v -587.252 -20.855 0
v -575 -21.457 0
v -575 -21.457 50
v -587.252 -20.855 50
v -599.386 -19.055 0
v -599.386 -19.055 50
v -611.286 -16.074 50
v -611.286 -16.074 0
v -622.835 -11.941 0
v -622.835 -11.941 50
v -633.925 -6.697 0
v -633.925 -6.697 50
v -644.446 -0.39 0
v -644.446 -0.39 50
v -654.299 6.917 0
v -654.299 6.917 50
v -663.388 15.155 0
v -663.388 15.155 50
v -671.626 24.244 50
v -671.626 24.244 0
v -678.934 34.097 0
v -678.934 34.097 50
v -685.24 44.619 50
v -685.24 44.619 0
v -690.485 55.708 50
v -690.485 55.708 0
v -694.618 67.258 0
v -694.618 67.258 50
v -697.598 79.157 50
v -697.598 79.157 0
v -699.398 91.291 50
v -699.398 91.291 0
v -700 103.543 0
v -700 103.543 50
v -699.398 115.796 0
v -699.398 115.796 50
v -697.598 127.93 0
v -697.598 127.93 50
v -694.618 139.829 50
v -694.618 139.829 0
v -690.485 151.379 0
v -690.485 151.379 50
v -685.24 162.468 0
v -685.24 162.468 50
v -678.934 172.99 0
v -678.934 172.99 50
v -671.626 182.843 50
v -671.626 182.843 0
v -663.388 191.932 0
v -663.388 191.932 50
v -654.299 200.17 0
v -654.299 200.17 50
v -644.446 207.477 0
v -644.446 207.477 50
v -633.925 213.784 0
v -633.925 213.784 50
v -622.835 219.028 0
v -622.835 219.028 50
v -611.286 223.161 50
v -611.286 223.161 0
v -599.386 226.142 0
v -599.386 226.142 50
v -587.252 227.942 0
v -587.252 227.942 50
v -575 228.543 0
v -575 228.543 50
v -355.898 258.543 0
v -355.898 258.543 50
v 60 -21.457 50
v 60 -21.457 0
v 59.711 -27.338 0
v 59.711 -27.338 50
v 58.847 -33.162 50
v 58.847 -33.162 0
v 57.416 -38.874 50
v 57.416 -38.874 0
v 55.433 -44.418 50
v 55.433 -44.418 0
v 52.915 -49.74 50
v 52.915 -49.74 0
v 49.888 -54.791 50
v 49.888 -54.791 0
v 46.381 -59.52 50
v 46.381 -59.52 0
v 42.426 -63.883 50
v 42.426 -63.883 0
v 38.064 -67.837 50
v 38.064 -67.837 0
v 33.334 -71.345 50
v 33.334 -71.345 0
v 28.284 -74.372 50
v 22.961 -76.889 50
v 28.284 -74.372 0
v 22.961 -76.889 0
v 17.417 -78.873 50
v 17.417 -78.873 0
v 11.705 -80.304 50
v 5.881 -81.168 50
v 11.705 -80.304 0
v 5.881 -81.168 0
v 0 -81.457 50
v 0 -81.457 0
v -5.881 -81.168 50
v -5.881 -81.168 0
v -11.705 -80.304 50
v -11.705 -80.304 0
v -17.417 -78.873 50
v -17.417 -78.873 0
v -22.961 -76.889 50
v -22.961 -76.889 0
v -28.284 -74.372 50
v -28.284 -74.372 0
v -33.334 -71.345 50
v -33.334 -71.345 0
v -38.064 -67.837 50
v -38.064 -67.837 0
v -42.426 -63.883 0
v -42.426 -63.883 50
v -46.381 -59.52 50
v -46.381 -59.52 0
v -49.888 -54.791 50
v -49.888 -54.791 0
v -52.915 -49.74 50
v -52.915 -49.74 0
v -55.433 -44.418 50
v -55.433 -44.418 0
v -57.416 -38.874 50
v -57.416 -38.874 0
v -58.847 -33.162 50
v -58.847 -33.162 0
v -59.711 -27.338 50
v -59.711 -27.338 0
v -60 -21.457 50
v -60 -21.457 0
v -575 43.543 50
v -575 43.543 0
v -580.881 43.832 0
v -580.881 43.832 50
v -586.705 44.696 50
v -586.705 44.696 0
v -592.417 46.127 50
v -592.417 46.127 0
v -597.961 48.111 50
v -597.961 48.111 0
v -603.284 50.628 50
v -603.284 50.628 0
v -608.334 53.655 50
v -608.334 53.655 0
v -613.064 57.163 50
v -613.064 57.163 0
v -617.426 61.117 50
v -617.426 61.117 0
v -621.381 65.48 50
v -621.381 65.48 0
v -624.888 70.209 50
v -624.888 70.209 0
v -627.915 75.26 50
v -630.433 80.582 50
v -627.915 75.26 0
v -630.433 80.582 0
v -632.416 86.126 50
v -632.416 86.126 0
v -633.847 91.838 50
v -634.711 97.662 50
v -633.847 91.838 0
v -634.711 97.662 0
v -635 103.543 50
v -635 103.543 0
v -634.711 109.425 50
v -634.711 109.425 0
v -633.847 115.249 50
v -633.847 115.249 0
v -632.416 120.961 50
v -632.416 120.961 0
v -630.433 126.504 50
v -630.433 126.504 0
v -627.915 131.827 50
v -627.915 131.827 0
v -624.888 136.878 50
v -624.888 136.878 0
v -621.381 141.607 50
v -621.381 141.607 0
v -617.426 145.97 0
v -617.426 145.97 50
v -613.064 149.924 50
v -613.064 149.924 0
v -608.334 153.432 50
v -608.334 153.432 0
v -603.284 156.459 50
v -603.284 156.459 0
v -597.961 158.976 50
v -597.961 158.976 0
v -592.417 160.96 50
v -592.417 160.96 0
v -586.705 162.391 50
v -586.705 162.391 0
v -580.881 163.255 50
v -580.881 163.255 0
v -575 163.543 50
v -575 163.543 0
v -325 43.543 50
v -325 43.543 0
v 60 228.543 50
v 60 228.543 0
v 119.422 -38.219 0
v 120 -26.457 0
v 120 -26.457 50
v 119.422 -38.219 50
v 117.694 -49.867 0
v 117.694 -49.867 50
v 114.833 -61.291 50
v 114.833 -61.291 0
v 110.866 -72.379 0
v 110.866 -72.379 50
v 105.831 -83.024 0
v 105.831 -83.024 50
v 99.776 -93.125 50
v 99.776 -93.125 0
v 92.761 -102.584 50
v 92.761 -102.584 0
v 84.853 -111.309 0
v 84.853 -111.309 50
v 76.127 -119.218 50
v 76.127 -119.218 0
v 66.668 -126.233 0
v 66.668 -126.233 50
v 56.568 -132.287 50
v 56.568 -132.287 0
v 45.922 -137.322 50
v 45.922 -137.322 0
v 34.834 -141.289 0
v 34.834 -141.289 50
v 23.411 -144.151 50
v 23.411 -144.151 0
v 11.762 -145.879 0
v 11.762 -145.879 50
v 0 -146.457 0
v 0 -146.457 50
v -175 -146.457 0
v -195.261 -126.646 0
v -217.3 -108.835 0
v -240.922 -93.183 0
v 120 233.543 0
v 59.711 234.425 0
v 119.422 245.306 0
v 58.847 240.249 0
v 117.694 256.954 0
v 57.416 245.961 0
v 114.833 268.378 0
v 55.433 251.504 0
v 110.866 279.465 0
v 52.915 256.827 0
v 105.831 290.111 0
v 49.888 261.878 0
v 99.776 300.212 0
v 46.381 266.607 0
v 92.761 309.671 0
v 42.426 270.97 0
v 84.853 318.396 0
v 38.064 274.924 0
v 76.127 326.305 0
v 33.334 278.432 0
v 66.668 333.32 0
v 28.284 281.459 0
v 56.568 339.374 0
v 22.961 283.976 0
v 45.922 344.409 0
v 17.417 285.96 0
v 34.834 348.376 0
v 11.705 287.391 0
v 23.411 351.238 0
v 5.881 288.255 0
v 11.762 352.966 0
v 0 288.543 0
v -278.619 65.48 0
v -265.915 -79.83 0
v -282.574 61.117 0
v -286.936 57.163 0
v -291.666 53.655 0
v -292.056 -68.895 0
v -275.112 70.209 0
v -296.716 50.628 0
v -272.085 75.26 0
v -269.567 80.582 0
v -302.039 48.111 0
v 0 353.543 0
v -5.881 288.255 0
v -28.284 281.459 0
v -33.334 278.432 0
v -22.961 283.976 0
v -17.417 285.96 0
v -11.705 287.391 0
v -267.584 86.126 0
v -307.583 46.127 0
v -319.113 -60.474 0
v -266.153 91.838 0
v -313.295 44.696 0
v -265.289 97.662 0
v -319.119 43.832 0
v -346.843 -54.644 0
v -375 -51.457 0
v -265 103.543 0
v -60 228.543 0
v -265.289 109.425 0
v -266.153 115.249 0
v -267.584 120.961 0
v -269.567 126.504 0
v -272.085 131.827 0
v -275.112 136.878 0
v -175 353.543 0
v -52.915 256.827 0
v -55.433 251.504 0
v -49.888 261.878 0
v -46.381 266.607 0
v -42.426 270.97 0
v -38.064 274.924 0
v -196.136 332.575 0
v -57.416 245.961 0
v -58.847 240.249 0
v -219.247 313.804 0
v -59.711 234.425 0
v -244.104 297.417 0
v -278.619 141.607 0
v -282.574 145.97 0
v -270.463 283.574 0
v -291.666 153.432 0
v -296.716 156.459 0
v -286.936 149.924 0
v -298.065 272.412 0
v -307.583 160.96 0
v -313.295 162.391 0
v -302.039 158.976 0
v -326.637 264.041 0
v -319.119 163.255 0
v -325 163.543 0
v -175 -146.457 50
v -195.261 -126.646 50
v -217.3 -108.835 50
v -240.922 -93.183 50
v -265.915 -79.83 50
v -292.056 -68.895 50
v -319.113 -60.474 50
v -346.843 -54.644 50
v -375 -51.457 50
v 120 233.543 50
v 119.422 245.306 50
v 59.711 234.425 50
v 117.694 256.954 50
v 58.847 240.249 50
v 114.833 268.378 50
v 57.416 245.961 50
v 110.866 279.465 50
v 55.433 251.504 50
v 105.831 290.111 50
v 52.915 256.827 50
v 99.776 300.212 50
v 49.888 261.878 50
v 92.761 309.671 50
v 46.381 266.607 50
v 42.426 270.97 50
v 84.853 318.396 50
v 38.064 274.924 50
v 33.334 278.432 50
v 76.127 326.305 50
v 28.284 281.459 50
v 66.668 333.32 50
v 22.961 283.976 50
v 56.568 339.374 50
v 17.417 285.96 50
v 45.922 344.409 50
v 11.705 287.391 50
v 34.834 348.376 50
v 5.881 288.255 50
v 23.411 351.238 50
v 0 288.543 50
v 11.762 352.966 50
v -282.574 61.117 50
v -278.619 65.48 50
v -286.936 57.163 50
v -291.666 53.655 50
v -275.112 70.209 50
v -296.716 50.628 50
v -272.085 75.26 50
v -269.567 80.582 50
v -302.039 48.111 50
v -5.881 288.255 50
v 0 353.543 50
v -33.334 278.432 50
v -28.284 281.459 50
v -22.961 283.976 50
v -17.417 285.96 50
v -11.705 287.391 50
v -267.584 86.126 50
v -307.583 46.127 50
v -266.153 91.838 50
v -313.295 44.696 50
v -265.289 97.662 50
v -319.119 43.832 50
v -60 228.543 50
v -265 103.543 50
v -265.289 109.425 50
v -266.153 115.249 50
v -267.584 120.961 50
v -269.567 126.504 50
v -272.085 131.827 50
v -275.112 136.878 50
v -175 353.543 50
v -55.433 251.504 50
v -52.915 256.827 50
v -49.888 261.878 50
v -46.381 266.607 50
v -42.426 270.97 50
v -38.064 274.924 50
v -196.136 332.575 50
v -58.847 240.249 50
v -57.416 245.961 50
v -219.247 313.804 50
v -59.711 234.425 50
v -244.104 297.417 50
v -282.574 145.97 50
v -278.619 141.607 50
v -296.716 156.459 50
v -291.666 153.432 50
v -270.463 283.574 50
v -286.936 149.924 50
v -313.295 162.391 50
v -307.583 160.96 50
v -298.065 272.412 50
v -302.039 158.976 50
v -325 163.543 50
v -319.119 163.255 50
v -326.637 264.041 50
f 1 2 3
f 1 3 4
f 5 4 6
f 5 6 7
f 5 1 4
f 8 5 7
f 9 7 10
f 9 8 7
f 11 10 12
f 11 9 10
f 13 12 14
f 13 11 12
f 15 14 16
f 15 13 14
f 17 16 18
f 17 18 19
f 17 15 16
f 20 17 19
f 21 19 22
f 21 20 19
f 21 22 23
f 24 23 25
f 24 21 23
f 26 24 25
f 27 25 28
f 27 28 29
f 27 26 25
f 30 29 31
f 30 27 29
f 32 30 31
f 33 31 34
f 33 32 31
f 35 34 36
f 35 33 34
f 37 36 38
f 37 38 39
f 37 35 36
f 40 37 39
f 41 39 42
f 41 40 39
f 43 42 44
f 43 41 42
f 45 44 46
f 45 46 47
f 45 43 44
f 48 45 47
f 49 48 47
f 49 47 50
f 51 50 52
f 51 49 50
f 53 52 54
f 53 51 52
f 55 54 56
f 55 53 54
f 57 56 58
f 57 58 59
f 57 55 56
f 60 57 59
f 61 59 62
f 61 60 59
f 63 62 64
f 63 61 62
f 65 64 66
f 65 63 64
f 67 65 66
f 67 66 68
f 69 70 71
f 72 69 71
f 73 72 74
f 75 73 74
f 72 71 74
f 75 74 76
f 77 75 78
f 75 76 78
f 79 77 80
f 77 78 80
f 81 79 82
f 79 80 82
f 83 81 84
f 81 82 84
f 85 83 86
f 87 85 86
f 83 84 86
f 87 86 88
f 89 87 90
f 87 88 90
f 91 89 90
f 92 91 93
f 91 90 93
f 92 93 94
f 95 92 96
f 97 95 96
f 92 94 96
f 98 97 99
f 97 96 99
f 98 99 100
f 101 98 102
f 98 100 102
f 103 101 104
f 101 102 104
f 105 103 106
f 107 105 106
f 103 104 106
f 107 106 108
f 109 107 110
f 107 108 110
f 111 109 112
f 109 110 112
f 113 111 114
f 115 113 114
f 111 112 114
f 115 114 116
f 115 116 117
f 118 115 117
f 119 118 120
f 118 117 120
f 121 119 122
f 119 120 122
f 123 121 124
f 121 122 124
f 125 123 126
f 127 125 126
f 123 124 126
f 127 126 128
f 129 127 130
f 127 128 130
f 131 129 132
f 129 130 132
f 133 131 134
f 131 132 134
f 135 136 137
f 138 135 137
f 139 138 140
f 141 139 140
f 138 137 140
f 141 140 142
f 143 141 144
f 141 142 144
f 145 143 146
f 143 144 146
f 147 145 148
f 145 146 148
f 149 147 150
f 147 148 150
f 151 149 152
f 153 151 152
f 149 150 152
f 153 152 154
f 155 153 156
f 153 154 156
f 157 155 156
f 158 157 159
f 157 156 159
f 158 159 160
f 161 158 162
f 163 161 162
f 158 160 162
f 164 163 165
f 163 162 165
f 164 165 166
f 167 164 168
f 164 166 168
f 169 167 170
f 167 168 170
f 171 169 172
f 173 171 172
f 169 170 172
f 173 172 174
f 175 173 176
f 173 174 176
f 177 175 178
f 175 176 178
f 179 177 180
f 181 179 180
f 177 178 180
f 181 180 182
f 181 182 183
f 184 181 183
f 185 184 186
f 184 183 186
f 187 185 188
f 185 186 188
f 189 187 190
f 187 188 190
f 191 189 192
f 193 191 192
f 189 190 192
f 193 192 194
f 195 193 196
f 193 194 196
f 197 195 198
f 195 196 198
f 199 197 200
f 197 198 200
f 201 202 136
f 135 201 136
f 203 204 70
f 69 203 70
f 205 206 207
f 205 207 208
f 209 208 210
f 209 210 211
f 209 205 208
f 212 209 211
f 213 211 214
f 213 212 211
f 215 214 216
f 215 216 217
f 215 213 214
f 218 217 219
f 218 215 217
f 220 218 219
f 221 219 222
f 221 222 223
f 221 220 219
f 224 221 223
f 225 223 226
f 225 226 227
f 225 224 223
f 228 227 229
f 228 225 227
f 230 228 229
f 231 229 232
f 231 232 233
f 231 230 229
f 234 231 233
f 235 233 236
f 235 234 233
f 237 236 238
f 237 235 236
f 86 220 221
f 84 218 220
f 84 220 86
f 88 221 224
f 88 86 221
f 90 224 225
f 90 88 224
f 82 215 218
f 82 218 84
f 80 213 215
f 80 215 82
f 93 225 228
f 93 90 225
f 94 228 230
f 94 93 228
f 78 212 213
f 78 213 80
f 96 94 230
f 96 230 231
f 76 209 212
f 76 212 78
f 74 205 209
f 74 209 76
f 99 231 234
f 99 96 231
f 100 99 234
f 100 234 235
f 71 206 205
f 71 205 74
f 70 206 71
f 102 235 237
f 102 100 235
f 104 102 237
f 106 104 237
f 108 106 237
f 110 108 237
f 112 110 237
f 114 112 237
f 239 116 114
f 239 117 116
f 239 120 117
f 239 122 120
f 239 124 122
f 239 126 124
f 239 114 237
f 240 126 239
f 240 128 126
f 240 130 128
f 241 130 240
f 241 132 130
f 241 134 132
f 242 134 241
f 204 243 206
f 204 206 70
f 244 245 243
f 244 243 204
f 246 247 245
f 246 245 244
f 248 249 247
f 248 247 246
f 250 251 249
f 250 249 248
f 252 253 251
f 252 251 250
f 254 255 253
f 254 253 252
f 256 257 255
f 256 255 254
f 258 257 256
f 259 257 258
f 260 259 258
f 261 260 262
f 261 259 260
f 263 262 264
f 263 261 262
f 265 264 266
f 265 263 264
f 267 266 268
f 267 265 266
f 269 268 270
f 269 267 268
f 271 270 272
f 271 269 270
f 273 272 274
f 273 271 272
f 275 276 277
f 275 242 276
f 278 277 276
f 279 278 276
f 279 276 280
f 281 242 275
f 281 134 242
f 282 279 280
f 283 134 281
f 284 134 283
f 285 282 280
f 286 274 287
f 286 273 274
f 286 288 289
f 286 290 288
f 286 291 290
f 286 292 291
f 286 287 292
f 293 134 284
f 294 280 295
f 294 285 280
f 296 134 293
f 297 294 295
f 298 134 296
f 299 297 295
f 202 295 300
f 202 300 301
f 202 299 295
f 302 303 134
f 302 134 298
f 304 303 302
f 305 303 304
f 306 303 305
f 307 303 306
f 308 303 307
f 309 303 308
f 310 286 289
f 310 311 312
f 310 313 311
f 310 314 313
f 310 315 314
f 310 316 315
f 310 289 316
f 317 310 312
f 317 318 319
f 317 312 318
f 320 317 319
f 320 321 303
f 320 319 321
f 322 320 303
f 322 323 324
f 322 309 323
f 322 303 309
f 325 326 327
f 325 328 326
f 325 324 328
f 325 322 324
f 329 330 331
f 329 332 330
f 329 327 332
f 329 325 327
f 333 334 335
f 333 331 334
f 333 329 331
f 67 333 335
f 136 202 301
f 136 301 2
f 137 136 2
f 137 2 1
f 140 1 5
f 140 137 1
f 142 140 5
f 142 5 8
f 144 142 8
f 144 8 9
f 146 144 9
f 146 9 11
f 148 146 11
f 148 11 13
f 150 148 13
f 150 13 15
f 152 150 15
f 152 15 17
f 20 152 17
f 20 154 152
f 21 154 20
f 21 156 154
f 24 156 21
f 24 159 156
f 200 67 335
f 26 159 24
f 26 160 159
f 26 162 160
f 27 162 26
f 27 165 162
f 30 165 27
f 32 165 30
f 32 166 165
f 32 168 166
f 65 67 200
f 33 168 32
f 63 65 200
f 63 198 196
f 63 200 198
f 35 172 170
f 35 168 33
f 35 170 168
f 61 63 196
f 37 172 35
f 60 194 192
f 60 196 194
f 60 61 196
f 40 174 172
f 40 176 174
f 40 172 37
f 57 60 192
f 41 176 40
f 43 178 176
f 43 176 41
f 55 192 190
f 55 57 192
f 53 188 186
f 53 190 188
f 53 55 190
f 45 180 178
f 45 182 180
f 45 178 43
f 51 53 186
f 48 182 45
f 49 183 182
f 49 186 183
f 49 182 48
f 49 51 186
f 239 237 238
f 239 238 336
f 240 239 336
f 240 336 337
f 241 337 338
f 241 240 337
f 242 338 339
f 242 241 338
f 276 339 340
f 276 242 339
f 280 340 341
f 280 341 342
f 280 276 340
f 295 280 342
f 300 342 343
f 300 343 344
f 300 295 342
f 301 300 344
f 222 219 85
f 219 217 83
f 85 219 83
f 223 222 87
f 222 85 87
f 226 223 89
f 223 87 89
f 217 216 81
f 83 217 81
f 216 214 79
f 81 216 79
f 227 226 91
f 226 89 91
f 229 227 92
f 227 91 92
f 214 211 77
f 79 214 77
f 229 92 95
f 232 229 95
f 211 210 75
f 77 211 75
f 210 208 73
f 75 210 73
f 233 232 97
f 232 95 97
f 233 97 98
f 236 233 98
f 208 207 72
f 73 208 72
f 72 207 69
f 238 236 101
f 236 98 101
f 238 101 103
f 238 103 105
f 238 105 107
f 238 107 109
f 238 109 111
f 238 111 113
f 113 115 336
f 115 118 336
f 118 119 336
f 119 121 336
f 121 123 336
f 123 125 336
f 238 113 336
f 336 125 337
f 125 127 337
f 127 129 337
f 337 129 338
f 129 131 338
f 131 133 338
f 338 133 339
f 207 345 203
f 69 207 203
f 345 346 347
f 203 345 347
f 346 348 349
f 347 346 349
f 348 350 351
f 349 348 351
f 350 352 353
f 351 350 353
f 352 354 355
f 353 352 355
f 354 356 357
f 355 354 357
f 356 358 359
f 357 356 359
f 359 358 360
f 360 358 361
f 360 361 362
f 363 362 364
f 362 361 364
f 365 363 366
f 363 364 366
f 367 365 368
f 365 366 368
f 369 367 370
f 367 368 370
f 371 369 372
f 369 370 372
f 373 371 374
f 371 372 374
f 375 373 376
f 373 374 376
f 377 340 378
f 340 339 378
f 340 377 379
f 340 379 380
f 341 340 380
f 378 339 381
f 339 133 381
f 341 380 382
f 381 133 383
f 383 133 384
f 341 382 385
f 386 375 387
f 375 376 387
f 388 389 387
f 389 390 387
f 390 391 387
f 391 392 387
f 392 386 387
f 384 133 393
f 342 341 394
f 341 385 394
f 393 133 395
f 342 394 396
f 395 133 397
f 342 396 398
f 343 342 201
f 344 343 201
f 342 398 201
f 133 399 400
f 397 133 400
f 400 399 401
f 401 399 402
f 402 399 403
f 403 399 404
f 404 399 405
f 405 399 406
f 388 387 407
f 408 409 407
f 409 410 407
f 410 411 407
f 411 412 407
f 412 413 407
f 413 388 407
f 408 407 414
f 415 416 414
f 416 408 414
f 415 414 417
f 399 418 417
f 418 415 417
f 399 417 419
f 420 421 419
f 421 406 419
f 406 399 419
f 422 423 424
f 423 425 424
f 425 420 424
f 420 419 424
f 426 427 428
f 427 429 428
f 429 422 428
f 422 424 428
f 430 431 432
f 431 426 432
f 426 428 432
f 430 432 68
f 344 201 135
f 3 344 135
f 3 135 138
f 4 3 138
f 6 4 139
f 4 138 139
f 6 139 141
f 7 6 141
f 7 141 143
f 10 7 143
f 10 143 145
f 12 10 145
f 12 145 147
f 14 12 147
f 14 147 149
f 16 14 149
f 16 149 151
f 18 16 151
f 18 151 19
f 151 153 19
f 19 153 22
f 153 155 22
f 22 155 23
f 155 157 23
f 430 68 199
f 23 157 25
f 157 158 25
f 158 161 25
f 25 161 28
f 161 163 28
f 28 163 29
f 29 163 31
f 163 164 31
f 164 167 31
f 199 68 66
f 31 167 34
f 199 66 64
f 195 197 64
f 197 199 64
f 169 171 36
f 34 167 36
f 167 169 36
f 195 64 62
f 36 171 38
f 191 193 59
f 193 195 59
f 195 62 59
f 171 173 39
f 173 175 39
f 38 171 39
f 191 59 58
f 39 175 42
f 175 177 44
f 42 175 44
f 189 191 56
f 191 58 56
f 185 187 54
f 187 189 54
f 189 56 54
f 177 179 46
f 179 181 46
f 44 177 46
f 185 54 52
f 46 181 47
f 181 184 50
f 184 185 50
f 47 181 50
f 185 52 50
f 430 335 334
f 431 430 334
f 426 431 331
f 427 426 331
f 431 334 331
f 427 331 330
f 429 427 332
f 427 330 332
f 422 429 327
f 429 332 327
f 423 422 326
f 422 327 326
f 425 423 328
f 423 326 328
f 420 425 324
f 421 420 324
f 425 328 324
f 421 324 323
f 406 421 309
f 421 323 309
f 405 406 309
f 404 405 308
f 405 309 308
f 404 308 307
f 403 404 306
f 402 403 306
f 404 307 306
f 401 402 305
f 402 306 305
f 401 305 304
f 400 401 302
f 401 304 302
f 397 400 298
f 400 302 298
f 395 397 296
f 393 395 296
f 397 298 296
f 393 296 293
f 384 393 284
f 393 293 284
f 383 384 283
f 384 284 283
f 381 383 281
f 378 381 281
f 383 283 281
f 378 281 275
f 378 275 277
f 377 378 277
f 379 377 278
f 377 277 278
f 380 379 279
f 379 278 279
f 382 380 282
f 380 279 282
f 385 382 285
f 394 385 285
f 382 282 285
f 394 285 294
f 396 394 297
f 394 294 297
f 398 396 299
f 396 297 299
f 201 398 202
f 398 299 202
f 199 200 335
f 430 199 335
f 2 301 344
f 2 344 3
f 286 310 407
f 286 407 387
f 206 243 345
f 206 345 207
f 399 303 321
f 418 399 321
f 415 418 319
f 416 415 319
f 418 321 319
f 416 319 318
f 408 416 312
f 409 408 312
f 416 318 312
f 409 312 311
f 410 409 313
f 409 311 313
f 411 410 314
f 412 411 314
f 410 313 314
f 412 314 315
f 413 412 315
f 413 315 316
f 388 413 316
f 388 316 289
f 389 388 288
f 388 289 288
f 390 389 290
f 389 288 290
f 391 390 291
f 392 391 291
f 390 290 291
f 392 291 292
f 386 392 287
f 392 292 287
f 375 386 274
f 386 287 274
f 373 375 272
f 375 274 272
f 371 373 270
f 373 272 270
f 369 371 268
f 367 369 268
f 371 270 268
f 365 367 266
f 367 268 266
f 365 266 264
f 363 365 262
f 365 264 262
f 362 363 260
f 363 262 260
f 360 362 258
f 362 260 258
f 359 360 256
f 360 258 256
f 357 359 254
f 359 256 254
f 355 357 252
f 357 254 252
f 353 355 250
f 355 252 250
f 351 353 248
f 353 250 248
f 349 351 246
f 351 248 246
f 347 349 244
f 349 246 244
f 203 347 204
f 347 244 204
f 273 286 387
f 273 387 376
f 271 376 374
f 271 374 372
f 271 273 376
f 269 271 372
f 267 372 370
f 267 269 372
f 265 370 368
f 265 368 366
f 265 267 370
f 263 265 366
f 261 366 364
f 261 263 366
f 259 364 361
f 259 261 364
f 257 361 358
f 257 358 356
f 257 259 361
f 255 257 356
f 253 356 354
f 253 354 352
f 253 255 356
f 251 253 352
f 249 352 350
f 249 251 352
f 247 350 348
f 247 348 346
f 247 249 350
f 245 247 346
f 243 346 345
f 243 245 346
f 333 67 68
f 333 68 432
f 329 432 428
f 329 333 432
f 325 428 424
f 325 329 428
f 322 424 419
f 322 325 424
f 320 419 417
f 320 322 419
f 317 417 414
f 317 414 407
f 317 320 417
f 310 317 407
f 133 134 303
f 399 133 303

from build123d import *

# Parameters (mm, degrees)
BOSS_EXTRUDE1_DEPTH = 50


with BuildPart() as part:
    # Sketch1 → Boss-Extrude1 (new body)
    with BuildSketch(Plane.XY):
        with BuildLine():
            Line((-175, 353.543476539), (0, 353.543476539))
            ThreePointArc((0, 353.543476539), (84.852813742, 318.396290281), (120, 233.543476539))
            Line((120, 233.543476539), (120, -26.456523461))
            ThreePointArc((120, -26.456523461), (84.852813742, -111.309337204), (0, -146.456523461))
            Line((0, -146.456523461), (-175, -146.456523461))
            ThreePointArc((-175, -146.456523461), (-265.915006149, -79.830220617), (-375, -51.456523461))
            Line((-375, -51.456523461), (-575, -21.456523461))
            ThreePointArc((-575, -21.456523461), (-700, 103.543476539), (-575, 228.543476539))
            Line((-575, 228.543476539), (-355.89794699, 258.543476539))
            ThreePointArc((-355.89794699, 258.543476539), (-257.111916312, 290.168144661), (-175, 353.543476539))
        make_face()
        with BuildLine():
            Line((60, 228.543476539), (60, -21.456523461))
            ThreePointArc((60, -21.456523461), (0, -81.456523461), (-60, -21.456523461))
            Line((-60, -21.456523461), (-60, 228.543476539))
            ThreePointArc((-60, 228.543476539), (0, 288.543476539), (60, 228.543476539))
        make_face(mode=Mode.SUBTRACT)
        with BuildLine():
            Line((-325, 43.543476539), (-575, 43.543476539))
            ThreePointArc((-575, 43.543476539), (-635, 103.543476539), (-575, 163.543476539))
            Line((-575, 163.543476539), (-325, 163.543476539))
            ThreePointArc((-325, 163.543476539), (-265, 103.543476539), (-325, 43.543476539))
        make_face(mode=Mode.SUBTRACT)
    extrude(amount=BOSS_EXTRUDE1_DEPTH)


solid = part.part
